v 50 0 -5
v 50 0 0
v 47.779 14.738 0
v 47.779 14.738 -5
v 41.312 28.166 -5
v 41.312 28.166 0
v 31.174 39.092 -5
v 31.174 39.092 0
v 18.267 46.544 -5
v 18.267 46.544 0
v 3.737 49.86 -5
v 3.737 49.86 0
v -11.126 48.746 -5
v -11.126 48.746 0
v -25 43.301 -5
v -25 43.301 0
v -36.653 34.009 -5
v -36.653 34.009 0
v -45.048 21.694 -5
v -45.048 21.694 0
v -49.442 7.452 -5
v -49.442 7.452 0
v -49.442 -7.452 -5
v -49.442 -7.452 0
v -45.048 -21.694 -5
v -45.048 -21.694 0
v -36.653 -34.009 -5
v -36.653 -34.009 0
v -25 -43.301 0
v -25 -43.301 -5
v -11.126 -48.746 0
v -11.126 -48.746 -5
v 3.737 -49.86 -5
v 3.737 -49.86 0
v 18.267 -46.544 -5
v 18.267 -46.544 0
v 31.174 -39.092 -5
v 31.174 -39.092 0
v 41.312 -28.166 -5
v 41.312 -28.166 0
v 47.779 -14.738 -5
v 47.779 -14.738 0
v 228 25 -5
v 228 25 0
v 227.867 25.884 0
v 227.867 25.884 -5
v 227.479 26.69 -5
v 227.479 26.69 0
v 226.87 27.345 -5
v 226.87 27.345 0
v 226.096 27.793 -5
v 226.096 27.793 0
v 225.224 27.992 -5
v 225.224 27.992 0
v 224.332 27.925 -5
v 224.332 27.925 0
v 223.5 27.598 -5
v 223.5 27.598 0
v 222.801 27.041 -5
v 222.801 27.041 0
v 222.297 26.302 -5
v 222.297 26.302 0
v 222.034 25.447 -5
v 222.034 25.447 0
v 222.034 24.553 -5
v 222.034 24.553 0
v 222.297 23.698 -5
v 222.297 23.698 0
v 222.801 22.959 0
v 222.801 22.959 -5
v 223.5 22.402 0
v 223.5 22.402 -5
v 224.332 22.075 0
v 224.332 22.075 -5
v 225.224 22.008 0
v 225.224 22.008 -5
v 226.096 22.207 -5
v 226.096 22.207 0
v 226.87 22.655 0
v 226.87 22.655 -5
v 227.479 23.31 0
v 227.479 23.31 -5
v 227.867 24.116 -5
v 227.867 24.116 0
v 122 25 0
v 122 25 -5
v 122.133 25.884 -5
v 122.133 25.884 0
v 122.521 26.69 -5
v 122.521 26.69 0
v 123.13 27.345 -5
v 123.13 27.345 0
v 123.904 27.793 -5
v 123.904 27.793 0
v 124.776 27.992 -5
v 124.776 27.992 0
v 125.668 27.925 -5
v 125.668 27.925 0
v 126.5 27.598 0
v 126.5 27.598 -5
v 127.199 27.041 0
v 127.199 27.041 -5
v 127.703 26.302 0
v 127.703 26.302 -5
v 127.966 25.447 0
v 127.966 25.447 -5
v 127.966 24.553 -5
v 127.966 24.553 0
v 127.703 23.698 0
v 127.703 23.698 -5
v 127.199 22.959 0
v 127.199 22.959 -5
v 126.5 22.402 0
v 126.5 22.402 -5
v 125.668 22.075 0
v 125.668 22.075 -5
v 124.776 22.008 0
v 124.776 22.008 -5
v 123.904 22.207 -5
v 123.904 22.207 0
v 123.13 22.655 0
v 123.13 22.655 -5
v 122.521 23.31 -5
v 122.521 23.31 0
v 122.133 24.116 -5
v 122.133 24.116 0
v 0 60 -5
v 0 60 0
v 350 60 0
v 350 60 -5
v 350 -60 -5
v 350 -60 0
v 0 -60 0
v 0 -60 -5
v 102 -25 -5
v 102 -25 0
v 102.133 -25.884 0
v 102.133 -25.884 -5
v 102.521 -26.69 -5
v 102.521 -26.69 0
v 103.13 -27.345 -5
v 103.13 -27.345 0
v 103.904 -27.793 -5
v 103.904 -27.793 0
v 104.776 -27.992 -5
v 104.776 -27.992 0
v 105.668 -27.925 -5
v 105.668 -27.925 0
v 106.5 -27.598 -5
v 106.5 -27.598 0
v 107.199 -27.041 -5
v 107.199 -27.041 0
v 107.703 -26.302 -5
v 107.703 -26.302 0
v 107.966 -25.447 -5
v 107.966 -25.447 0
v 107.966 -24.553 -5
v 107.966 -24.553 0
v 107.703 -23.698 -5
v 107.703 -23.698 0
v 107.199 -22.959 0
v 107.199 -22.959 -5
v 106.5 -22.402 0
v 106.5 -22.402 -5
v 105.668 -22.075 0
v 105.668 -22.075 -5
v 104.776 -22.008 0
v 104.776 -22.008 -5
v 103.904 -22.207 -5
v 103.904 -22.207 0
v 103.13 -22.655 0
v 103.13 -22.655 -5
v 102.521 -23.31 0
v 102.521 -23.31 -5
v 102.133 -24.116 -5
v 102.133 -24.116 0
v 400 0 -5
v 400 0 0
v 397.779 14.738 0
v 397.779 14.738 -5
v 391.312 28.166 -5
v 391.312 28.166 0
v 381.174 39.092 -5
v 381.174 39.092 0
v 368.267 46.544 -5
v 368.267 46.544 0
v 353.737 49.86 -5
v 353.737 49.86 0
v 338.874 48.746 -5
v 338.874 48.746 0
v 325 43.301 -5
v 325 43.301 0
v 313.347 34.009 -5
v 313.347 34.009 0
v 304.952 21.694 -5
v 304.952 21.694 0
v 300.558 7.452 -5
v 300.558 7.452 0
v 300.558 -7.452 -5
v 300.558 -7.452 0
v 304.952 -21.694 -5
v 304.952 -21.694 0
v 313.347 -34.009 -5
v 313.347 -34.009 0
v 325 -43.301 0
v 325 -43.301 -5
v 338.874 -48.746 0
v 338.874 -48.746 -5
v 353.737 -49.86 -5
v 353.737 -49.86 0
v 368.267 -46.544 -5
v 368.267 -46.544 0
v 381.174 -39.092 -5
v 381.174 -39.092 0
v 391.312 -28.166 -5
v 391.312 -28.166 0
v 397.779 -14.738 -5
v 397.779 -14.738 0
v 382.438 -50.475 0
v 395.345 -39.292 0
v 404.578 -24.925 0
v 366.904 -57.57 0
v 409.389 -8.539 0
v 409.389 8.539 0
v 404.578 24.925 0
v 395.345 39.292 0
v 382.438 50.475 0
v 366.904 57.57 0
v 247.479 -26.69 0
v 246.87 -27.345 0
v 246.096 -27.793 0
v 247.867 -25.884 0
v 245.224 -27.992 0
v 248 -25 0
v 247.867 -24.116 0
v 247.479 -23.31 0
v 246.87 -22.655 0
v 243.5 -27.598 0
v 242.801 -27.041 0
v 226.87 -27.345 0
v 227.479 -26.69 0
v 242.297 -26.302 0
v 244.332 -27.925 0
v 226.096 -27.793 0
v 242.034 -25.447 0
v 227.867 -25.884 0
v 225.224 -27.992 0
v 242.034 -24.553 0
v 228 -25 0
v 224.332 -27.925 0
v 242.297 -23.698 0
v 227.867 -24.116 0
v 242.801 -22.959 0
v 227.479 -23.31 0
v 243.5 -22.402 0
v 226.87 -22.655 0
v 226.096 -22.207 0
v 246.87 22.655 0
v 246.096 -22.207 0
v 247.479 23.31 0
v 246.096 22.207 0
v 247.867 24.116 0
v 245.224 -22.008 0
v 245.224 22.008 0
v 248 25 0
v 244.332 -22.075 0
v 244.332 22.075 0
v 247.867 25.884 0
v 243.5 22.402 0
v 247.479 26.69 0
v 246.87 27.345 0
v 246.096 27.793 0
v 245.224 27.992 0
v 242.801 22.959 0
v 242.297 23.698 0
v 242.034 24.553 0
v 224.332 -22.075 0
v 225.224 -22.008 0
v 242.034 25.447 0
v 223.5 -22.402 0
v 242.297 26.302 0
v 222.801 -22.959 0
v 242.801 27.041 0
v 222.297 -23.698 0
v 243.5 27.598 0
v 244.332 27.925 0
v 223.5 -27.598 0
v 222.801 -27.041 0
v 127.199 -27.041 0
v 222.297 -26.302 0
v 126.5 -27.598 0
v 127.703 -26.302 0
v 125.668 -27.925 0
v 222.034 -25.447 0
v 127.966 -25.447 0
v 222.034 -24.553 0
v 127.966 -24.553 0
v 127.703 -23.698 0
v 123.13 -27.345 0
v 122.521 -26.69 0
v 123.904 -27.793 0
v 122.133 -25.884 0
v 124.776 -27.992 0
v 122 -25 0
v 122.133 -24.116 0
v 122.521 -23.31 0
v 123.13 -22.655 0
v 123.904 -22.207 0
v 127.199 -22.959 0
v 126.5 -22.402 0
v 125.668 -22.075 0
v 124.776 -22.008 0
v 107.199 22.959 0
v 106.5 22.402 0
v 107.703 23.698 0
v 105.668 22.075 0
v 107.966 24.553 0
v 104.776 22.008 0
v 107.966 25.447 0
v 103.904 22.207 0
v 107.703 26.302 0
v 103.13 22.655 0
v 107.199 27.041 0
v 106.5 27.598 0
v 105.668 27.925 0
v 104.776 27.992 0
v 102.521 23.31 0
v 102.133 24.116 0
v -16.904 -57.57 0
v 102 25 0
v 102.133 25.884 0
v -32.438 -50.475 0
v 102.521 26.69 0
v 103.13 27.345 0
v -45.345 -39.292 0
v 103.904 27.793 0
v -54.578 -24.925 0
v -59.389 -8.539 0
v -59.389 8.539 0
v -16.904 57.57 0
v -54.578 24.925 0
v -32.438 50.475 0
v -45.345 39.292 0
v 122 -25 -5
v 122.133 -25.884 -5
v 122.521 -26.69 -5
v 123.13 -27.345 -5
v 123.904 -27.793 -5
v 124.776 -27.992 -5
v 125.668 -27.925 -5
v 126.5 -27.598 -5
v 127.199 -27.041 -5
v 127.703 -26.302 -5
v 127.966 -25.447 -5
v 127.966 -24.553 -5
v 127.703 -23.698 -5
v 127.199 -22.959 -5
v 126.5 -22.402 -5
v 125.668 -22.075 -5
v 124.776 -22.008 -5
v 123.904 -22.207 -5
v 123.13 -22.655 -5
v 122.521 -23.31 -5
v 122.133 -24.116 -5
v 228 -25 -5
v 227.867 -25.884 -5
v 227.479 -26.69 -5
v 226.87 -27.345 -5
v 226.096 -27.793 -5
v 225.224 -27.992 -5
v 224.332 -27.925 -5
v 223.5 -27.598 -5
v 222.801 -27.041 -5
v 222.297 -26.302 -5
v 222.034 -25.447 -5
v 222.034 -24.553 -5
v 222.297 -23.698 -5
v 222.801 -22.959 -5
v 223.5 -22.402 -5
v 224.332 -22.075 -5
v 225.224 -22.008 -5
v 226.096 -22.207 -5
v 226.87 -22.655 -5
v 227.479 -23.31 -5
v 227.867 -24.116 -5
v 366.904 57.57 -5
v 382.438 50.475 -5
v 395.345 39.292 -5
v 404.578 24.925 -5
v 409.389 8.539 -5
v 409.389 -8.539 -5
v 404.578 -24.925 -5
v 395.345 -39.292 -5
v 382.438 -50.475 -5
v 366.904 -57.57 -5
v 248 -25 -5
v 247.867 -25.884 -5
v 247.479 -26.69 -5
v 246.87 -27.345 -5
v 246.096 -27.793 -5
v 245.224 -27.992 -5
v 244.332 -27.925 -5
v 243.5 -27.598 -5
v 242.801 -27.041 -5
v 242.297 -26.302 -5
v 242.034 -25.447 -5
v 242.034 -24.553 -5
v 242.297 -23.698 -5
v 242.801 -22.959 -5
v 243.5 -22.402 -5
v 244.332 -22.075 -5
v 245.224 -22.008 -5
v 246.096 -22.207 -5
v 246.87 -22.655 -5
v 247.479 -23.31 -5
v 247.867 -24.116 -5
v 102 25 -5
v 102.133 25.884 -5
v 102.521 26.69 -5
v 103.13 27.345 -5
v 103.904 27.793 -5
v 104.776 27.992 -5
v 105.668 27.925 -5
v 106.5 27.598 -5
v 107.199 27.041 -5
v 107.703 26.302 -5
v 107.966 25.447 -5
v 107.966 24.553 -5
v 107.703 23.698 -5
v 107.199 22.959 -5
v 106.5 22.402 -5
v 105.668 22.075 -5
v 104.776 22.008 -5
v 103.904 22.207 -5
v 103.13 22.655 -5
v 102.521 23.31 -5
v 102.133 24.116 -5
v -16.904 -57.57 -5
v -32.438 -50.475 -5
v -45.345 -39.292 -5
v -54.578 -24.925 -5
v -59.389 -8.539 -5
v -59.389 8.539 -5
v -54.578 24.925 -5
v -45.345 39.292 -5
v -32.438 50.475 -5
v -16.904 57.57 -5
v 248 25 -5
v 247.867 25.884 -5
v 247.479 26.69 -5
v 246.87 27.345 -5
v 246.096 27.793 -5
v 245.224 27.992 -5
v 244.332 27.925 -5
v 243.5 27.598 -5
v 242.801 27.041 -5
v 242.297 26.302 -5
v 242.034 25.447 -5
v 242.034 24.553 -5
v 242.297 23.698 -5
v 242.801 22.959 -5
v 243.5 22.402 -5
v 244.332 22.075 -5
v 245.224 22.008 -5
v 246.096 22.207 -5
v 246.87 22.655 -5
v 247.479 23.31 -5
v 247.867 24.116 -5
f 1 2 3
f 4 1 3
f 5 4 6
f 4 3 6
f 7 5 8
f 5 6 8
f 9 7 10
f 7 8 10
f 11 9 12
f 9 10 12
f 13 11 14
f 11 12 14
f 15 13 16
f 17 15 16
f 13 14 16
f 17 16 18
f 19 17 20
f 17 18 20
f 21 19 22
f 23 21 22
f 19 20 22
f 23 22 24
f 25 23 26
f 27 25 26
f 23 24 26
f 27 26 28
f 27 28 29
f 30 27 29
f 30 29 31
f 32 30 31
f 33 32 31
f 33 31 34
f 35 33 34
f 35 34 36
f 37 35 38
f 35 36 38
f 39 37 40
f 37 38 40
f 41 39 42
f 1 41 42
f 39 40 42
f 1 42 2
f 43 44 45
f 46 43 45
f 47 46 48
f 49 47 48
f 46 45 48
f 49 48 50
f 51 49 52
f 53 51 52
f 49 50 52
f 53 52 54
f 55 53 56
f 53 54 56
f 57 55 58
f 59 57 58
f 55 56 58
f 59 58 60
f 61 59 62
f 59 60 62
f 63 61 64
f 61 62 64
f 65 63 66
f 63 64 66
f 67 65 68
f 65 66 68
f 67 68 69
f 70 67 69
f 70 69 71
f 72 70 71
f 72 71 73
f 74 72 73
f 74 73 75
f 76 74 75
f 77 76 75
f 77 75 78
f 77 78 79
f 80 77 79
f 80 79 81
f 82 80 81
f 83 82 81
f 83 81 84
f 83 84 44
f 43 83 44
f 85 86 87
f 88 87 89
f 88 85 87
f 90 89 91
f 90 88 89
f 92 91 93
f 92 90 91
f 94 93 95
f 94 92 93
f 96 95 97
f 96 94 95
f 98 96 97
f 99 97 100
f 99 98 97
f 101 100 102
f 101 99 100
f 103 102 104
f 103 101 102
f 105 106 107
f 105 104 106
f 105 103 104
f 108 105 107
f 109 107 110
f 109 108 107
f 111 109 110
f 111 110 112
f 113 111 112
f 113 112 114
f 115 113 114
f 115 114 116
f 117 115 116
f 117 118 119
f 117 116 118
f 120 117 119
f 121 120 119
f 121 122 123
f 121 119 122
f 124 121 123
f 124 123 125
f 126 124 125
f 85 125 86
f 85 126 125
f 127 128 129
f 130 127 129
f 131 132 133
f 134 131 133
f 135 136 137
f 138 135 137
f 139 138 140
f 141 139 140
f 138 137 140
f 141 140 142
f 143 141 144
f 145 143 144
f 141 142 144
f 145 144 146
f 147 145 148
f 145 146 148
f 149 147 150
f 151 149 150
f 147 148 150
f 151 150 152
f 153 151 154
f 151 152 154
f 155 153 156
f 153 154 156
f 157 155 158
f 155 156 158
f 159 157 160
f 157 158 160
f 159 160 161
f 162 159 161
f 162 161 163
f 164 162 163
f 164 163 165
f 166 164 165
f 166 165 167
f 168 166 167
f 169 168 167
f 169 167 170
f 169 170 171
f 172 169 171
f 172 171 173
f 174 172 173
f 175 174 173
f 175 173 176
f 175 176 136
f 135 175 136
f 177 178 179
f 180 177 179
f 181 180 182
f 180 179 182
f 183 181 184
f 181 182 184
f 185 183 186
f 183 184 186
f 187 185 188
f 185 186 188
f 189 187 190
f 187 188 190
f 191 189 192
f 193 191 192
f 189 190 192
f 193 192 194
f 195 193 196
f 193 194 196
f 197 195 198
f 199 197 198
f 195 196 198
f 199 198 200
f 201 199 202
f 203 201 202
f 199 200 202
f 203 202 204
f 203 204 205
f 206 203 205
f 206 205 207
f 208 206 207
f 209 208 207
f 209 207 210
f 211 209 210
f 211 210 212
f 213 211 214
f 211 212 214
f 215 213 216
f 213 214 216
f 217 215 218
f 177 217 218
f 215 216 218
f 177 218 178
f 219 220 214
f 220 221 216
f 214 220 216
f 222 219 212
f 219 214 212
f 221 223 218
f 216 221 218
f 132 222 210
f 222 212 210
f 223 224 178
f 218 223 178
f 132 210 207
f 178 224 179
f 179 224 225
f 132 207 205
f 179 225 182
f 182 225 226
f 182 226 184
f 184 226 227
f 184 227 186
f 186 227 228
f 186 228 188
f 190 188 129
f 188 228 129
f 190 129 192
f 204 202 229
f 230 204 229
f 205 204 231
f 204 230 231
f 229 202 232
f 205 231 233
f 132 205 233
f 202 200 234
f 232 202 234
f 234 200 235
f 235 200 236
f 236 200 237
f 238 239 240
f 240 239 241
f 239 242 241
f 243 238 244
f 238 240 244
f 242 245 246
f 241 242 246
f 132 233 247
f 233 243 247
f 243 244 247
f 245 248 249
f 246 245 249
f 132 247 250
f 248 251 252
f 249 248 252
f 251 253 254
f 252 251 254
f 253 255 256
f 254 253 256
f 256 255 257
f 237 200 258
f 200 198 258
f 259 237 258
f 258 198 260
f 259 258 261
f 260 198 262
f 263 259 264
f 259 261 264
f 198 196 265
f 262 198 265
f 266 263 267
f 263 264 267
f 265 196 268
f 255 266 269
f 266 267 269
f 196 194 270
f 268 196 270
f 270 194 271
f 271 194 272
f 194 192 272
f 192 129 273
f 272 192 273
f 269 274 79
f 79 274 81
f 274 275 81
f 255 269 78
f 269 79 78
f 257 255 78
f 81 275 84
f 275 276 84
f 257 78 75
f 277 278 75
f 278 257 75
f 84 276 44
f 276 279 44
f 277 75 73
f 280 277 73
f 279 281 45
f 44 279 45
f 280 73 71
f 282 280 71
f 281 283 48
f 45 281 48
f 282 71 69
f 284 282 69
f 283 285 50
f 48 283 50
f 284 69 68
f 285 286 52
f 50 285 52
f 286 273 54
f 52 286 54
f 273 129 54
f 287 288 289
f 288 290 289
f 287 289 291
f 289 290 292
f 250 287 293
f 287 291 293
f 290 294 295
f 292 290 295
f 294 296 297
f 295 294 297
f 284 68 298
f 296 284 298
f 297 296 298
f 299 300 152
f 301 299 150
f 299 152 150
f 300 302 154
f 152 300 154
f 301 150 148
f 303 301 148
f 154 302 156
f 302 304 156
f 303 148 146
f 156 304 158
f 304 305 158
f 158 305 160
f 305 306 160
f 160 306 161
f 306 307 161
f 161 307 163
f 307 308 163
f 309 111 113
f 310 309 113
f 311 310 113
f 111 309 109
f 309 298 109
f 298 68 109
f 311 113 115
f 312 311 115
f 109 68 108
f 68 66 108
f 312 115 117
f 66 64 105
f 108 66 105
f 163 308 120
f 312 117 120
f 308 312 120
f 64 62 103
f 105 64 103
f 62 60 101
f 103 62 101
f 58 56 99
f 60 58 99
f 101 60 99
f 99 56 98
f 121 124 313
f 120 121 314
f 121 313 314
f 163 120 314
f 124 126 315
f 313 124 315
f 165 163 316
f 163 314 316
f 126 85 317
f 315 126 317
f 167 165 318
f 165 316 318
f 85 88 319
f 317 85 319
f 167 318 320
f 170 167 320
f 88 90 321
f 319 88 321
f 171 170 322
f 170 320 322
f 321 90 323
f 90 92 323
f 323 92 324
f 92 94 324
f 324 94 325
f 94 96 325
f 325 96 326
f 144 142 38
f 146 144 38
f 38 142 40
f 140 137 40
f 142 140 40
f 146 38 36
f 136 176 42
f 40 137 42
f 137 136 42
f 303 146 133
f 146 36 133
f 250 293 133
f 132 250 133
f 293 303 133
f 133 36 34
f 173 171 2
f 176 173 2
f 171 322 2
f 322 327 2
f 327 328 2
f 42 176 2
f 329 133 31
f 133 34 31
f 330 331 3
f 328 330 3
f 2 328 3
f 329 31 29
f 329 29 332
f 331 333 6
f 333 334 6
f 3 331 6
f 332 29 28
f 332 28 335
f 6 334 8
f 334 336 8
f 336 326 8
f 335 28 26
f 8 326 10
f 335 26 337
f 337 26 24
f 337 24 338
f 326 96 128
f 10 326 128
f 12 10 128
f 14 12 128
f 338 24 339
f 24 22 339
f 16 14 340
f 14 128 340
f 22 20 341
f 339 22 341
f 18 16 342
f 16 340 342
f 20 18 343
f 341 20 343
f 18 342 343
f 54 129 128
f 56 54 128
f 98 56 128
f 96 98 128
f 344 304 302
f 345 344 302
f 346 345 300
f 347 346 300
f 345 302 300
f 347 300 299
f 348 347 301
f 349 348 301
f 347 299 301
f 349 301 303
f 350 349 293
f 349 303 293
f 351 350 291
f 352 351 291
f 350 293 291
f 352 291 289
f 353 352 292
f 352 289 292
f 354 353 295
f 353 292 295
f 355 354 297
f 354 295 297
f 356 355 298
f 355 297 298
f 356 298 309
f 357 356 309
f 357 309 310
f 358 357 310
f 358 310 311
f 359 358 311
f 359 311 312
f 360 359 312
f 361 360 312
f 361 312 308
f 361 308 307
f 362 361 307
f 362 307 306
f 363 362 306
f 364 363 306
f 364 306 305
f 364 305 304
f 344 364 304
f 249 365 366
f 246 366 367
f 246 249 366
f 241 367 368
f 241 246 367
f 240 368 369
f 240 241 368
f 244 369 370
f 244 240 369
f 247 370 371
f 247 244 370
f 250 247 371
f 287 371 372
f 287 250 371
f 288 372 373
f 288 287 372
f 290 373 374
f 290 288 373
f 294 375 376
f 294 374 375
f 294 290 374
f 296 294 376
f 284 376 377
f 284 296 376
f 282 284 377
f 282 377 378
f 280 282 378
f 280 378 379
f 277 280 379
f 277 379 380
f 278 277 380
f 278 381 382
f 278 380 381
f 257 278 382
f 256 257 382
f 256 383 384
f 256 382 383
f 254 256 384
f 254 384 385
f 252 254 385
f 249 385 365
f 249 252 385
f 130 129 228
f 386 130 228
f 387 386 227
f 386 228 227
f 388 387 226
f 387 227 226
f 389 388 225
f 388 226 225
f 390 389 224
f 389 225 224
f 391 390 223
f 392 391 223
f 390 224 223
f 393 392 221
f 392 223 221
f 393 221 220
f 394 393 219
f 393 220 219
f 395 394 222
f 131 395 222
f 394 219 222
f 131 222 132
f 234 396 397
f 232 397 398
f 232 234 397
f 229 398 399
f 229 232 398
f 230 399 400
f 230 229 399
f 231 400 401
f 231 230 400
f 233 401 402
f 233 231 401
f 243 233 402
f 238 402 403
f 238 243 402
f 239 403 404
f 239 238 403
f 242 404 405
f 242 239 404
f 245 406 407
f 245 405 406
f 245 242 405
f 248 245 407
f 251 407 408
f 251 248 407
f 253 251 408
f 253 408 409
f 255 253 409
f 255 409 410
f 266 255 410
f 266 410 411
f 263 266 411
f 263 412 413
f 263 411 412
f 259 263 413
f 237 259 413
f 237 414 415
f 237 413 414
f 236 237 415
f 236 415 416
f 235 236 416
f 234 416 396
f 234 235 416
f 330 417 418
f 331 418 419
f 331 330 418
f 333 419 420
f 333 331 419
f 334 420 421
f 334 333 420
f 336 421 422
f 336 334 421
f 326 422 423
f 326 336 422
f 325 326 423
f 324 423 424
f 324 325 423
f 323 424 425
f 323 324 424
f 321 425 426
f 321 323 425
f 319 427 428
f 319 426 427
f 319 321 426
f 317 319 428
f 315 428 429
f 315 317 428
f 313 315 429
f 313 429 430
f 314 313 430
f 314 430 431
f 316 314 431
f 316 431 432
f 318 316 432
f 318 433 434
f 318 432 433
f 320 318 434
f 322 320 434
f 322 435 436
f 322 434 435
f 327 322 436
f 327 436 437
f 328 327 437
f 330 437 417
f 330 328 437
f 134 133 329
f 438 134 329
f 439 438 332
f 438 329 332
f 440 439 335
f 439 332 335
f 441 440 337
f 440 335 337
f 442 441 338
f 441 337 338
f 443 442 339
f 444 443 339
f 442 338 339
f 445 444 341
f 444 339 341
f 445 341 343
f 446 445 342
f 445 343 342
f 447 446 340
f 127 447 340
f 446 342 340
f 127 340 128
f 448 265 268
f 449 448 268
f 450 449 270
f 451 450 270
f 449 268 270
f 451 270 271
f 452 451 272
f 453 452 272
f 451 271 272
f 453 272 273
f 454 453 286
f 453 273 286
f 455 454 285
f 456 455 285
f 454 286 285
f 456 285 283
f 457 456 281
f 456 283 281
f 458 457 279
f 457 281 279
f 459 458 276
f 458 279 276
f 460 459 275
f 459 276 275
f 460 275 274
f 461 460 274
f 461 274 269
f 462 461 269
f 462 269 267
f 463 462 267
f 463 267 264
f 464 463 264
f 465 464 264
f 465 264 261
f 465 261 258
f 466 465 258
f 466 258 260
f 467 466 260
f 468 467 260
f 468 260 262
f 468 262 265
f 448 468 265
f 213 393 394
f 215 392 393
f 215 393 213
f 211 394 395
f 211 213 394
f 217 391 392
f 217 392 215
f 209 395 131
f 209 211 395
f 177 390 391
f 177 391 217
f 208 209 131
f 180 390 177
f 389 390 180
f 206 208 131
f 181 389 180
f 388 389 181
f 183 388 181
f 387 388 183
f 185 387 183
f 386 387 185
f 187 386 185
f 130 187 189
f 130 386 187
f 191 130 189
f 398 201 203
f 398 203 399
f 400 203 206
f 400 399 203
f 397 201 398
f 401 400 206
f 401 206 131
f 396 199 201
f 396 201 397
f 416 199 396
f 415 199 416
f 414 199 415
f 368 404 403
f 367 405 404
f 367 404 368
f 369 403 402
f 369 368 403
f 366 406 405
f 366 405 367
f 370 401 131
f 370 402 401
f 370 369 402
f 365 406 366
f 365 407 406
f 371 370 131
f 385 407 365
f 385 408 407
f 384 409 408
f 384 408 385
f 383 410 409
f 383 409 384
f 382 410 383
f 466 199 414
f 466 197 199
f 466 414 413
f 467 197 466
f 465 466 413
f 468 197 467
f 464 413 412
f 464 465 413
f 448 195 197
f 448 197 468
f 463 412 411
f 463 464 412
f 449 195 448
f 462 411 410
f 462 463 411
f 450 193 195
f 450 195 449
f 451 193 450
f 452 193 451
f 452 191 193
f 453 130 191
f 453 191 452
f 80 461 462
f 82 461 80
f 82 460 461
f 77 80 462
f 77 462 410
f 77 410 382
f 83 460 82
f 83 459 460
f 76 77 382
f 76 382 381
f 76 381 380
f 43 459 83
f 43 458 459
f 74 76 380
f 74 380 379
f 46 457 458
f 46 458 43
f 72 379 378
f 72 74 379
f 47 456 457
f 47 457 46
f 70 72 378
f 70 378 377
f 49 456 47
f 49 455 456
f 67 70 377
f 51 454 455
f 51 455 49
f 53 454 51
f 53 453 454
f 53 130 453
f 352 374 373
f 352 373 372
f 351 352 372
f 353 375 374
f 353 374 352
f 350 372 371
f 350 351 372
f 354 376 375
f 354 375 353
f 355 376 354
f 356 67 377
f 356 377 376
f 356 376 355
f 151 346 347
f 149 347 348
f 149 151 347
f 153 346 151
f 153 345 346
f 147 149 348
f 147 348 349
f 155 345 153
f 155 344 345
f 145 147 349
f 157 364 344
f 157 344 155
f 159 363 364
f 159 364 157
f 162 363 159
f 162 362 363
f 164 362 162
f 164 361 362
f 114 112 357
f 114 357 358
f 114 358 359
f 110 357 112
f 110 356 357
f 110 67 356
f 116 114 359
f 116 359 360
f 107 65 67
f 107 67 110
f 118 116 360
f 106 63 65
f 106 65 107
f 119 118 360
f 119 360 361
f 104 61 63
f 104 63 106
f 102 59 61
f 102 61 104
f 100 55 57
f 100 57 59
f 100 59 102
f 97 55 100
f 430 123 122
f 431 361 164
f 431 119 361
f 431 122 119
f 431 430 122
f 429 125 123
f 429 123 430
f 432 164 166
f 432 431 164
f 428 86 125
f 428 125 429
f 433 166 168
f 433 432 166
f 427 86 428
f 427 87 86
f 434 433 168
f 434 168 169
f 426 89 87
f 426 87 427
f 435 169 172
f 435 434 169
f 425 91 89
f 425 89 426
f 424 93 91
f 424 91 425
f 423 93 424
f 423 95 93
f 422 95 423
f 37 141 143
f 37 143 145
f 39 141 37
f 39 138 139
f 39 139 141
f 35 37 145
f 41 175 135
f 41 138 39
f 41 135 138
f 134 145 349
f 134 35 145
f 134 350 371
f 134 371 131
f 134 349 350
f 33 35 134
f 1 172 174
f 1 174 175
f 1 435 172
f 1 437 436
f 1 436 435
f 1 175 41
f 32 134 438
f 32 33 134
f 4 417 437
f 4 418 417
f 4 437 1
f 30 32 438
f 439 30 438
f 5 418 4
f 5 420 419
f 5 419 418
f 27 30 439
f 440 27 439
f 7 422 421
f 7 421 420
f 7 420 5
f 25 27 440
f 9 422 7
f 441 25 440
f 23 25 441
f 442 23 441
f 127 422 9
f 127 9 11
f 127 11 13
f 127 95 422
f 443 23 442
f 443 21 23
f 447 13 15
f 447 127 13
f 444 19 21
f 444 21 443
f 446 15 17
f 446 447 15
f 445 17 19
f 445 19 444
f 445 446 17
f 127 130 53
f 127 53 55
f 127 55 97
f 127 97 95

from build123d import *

# Parameters (mm, degrees)
SKETCH_2_R               = 50
SM_BASE_FLANGE_1_DEPTH   = 5
SKETCH_3_R               = 3
CUT_EXTRUDE_1_DEPTH      = 10
MIRROR_2_COPY_1_SKETCH_R = 3
MIRROR_2_COPY_1_DEPTH    = 10


# Sheet-metal steps are written as plain solids
with BuildPart() as part:
    # Sketch 2 → 基体-法兰1 (new body)
    with BuildSketch(Plane.XY):
        with BuildLine():
            Line((0, 60), (350, 60))
            ThreePointArc((350, 60), (410, 0), (350, -60))
            Line((350, -60), (0, -60))
            ThreePointArc((0, -60), (-60, 0), (0, 60))
        make_face()
        Circle(SKETCH_2_R, mode=Mode.SUBTRACT)
        with Locations((350, 0)):
            Circle(SKETCH_2_R, mode=Mode.SUBTRACT)
    extrude(amount=-SM_BASE_FLANGE_1_DEPTH)

    # 草图3 → 切除-拉伸1 (cut)
    with BuildSketch(Plane.XY):
        with Locations((225, 25)):
            Circle(SKETCH_3_R)
        with Locations((245, 25)):
            Circle(SKETCH_3_R)
    cut_extrude_1 = extrude(amount=-CUT_EXTRUDE_1_DEPTH, mode=Mode.SUBTRACT)

    # 镜向1: 切除-拉伸1 across plane
    add(cut_extrude_1.mirror(Plane.ZX), mode=Mode.SUBTRACT)

    # 镜向2: 切除-拉伸1 across plane
    add(cut_extrude_1.mirror(Plane(origin=(175, 0, 0), x_dir=(0, 0, 1), z_dir=(1, 0, 0))), mode=Mode.SUBTRACT)

    # 镜向2 copy 1 sketch → 镜向2 copy 1 (cut)
    with BuildSketch(Plane(origin=(350, 0, 0), x_dir=(-1, 0, 0), z_dir=(0, 0, 1))):
        with Locations((225, 25)):
            Circle(MIRROR_2_COPY_1_SKETCH_R)
        with Locations((245, 25)):
            Circle(MIRROR_2_COPY_1_SKETCH_R)
    extrude(amount=-MIRROR_2_COPY_1_DEPTH, mode=Mode.SUBTRACT)


solid = part.part
